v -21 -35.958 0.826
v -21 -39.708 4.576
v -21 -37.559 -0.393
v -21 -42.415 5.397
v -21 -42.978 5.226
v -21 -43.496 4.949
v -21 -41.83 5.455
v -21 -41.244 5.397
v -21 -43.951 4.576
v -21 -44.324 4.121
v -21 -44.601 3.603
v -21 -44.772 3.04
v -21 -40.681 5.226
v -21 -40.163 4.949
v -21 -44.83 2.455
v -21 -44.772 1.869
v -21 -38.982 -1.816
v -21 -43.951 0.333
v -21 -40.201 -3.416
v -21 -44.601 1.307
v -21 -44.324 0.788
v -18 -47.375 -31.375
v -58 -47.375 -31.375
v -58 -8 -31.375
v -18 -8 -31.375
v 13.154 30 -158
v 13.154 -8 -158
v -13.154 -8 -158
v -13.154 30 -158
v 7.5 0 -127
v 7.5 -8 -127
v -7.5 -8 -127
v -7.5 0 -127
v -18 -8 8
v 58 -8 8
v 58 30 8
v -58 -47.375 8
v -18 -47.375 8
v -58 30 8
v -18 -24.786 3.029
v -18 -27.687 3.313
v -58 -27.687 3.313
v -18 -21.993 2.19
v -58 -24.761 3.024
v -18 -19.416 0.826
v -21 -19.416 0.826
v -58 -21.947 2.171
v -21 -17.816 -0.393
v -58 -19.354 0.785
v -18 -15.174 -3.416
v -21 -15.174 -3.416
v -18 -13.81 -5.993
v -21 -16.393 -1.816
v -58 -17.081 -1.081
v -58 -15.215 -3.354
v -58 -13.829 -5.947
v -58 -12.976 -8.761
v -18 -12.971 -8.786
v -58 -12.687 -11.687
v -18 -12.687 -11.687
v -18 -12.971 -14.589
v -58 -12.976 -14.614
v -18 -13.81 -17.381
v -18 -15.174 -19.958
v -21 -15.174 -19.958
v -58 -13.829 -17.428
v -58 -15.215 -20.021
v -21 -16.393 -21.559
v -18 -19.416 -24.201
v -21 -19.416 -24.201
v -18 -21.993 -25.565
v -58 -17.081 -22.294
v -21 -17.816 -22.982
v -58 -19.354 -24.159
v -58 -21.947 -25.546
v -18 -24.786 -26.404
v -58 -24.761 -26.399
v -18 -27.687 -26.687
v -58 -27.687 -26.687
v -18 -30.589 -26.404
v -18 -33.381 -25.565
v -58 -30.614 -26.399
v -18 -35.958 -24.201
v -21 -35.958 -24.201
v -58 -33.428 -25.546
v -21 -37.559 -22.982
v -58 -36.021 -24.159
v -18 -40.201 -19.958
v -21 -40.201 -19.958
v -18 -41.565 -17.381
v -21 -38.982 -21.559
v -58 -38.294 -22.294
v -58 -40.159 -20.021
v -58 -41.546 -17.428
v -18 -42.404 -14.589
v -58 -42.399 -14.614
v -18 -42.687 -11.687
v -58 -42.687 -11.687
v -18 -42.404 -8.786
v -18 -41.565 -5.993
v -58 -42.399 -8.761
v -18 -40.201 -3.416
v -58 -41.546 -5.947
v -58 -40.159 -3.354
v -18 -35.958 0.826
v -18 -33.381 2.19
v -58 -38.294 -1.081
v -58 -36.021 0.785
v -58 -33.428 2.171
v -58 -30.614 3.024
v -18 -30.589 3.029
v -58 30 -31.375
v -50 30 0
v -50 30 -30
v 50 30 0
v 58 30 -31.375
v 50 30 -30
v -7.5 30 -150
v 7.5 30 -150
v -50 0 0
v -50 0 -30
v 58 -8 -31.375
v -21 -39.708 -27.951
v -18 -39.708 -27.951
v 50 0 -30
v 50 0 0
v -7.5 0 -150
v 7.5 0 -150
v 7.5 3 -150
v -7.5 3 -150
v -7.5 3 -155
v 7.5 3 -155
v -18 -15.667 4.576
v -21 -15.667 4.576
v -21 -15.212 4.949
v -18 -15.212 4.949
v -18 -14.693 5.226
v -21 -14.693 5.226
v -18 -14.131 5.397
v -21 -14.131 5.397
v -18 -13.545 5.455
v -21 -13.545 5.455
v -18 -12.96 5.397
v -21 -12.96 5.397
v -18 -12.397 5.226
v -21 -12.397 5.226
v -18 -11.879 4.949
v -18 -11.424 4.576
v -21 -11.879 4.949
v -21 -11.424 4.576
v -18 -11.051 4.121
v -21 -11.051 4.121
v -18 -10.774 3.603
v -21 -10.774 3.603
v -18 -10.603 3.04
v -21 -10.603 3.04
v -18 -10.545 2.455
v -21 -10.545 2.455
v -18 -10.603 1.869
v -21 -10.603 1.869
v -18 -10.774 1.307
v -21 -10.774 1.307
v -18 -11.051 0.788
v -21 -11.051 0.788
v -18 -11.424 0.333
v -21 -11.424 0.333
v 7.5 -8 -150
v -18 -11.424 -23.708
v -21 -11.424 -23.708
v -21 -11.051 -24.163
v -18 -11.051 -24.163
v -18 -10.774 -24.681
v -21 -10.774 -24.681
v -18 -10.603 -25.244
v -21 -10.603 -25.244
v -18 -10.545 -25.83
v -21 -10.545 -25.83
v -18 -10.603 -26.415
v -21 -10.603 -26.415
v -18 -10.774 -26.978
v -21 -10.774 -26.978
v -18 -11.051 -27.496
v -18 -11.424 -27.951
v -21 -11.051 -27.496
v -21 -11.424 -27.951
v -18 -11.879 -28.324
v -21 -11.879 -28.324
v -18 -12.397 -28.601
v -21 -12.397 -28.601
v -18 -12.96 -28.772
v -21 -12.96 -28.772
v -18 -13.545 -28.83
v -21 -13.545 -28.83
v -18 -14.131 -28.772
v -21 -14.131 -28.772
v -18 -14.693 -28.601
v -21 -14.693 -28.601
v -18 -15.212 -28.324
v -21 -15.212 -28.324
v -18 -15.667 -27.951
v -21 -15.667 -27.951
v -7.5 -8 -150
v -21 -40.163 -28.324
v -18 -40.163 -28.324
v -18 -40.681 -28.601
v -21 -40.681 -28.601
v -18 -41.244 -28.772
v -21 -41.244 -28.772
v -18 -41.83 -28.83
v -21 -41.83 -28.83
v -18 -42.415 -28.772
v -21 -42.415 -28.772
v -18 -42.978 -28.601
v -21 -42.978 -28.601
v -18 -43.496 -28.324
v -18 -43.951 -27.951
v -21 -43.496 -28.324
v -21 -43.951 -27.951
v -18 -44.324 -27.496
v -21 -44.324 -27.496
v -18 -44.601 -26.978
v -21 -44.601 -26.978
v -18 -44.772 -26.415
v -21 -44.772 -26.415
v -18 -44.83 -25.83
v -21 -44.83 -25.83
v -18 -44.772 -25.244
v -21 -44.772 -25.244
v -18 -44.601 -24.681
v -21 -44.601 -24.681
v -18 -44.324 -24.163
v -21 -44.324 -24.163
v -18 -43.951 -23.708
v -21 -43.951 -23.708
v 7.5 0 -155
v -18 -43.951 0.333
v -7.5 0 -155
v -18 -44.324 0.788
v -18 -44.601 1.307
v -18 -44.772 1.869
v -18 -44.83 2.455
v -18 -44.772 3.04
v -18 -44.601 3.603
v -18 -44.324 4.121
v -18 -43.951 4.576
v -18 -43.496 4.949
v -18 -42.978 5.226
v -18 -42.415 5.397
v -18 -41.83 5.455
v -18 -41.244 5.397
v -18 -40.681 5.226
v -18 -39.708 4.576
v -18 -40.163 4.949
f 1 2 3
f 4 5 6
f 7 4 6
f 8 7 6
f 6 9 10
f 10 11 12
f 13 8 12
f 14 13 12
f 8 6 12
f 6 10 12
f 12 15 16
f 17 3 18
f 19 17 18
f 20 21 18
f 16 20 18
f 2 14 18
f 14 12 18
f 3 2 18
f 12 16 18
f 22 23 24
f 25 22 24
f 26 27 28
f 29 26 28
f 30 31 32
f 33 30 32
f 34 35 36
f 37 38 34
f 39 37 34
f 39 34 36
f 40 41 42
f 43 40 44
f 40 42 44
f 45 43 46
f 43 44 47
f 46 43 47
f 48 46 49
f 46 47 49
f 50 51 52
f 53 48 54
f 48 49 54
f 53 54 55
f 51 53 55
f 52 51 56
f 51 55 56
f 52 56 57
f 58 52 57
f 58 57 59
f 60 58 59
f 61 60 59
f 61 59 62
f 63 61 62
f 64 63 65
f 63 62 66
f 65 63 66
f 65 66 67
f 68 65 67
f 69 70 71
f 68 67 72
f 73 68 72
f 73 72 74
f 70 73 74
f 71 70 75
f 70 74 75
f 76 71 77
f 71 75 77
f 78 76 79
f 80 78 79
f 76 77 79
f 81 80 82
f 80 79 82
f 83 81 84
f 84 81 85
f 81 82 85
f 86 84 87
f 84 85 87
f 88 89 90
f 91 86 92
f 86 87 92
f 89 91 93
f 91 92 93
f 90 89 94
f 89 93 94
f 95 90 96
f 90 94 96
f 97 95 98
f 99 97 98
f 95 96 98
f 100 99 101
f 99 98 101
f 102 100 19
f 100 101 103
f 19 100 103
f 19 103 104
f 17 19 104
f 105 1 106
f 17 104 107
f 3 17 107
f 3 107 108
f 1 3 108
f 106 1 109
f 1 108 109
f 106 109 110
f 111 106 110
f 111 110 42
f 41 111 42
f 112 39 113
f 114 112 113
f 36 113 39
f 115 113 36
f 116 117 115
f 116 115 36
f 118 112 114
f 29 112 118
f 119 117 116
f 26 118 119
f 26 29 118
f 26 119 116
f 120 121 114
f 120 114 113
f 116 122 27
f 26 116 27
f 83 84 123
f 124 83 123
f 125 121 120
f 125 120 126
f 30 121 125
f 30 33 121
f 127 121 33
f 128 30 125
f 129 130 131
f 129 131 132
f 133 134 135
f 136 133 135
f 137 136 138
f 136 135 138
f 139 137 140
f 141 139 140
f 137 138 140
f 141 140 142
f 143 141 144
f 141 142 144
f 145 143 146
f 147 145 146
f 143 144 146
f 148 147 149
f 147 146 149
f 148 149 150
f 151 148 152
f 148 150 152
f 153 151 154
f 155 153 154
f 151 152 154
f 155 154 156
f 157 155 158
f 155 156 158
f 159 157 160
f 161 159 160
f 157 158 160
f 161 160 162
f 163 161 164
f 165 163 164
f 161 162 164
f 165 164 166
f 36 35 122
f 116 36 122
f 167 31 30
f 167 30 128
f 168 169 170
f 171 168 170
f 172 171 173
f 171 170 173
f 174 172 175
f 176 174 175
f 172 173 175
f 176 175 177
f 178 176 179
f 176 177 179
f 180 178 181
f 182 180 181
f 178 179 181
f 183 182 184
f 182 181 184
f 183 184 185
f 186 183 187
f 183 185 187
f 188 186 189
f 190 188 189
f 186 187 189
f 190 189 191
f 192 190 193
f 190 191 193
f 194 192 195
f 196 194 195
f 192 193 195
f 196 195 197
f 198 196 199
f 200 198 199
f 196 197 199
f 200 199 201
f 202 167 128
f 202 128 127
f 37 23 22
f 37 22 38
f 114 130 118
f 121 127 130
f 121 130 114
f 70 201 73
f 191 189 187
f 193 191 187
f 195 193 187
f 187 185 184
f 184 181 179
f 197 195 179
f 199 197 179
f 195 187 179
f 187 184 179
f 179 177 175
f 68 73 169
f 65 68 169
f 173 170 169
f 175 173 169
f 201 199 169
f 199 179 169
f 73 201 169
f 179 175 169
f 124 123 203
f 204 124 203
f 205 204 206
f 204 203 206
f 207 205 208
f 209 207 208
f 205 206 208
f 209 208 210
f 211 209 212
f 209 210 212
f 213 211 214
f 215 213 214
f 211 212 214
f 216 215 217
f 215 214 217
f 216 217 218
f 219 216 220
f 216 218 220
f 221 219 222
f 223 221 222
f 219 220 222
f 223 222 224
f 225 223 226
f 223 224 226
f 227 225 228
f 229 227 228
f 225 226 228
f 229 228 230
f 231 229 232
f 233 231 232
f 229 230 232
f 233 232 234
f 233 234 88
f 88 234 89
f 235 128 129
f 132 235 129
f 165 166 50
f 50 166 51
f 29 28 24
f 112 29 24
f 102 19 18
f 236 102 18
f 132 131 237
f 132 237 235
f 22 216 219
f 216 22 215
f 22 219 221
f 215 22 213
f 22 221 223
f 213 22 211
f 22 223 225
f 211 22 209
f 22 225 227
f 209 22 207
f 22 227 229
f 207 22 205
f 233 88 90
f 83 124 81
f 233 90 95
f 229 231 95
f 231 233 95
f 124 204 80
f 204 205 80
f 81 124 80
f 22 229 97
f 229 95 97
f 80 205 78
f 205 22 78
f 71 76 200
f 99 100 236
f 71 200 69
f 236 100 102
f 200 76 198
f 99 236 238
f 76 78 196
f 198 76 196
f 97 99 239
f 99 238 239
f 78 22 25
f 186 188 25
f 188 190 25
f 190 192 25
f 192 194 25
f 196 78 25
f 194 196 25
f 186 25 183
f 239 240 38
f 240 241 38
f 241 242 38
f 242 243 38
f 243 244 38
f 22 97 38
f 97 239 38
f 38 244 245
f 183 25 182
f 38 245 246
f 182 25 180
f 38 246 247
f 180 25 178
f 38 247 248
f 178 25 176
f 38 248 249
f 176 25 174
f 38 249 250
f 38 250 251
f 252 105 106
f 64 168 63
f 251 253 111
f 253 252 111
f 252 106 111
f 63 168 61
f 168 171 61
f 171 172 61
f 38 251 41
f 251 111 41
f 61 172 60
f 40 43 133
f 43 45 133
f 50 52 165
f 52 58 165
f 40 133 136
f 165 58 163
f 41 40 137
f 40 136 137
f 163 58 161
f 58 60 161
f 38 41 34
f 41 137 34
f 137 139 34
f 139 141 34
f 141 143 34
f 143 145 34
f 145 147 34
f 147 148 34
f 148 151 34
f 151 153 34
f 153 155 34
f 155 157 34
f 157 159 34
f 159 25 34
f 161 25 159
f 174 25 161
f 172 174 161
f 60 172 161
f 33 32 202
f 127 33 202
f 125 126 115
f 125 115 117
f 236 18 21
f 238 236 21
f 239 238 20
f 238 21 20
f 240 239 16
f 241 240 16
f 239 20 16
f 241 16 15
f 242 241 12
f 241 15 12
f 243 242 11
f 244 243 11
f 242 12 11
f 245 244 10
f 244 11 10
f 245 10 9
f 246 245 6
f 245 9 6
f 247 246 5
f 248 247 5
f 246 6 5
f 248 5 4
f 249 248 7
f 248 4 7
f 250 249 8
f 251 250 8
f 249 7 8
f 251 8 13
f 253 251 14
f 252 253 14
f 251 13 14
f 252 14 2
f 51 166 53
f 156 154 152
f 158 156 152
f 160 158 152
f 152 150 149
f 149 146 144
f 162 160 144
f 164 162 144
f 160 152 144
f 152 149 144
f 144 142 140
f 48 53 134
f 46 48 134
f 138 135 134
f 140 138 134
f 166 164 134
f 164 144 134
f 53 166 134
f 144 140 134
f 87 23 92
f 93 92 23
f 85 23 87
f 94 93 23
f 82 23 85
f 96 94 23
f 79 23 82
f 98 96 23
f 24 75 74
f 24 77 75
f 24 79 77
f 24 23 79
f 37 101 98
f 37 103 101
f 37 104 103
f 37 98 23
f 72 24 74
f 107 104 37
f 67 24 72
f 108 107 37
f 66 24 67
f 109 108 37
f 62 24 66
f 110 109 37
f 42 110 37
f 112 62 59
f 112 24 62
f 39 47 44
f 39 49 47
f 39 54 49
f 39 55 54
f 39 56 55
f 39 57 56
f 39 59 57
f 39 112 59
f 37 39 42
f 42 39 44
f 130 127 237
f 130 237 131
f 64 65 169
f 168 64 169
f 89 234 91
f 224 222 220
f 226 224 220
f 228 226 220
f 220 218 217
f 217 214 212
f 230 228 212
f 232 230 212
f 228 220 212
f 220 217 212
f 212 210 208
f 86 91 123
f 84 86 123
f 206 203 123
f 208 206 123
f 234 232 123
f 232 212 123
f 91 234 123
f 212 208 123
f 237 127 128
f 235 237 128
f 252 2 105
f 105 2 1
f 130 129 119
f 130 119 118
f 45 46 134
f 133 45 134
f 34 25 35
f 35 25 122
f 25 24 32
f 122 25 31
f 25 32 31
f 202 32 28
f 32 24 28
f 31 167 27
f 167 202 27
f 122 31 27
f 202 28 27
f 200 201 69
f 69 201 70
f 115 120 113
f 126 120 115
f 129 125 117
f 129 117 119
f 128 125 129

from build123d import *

# Parameters (mm, degrees)
BOSS_EXTRUDE1_DEPTH = 30
SHELL2_T            = 8
SKETCH2_W           = 15
SKETCH2_H           = 23
CUT_EXTRUDE1_DEPTH  = 8
SKETCH3_W           = 15
SKETCH3_H           = 3
CUT_EXTRUDE2_DEPTH  = 5
SKETCH4_W           = 39.3748274
SKETCH4_H           = 39.3748274
SKETCH4_R           = 15
BOSS_EXTRUDE2_DEPTH = 40
CUT_EXTRUDE3_START  = -3
CUT_EXTRUDE3_DEPTH  = 3
CIRPATTERN1_COUNT   = 4


with BuildPart() as part:
    # Sketch1 → Boss-Extrude1 (new body)
    with BuildSketch(Plane(origin=(0, 0, 0), x_dir=(1, 0, 0), z_dir=(0, 1, 0))):
        Polygon((-50, 0), (50, 0), (50, 30), (7.5, 150), (-7.5, 150), (-50, 30), align=None)
    extrude(amount=BOSS_EXTRUDE1_DEPTH)

    # Shell2
    shell2_openings = [part.faces().sort_by_distance(p)[0] for p in [
        (0, 30, -56.96969697),
    ]]
    offset(amount=SHELL2_T, openings=shell2_openings, kind=Kind.INTERSECTION)

    # Sketch2 → Cut-Extrude1 (cut)
    with BuildSketch(Plane(origin=(0, -8, 0), x_dir=(-1, 0, 0), z_dir=(0, -1, 0))):
        with Locations((0, 138.5)):
            Rectangle(SKETCH2_W, SKETCH2_H)
    extrude(amount=-CUT_EXTRUDE1_DEPTH, mode=Mode.SUBTRACT)

    # Sketch3 → Cut-Extrude2 (cut)
    with BuildSketch(Plane.XY.offset(-150)):
        with Locations((0, 1.5)):
            Rectangle(SKETCH3_W, SKETCH3_H)
    extrude(amount=-CUT_EXTRUDE2_DEPTH, mode=Mode.SUBTRACT)

    # Sketch4 → Boss-Extrude2 (add)
    with BuildSketch(Plane.ZY.offset(58)):
        with Locations((-11.6874137, -27.6874137)):
            Rectangle(SKETCH4_W, SKETCH4_H)
        with Locations((-11.6874137, -27.6874137)):
            Circle(SKETCH4_R, mode=Mode.SUBTRACT)
    extrude(amount=-BOSS_EXTRUDE2_DEPTH)

    # Sketch5 → Cut-Extrude3 (cut)
    with BuildSketch(Plane(origin=(-18, 0, 0), x_dir=(0, 0, -1), z_dir=(1, 0, 0)).offset(CUT_EXTRUDE3_START)):
        with BuildLine():
            Line((27.950869668, -15.66659842), (24.201038889, -19.416429198))
            ThreePointArc((24.201038889, -19.416429198), (22.294015418, -17.080811982), (19.958398202, -15.173788511))
            Line((19.958398202, -15.173788511), (23.70822898, -11.423957733))
            ThreePointArc((23.70822898, -11.423957733), (27.950869668, -11.423957733), (27.950869668, -15.66659842))
        make_face()
    cut_extrude3 = extrude(amount=CUT_EXTRUDE3_DEPTH, mode=Mode.SUBTRACT)

    # CirPattern1: Cut-Extrude3 ×4 about axis
    cirpattern1_axis = Axis((0, -27.6874137, -11.6874137), (1, 0, 0))
    for i in range(1, CIRPATTERN1_COUNT):
        add(cut_extrude3.rotate(cirpattern1_axis, i * 360 / CIRPATTERN1_COUNT), mode=Mode.SUBTRACT)


solid = part.part
